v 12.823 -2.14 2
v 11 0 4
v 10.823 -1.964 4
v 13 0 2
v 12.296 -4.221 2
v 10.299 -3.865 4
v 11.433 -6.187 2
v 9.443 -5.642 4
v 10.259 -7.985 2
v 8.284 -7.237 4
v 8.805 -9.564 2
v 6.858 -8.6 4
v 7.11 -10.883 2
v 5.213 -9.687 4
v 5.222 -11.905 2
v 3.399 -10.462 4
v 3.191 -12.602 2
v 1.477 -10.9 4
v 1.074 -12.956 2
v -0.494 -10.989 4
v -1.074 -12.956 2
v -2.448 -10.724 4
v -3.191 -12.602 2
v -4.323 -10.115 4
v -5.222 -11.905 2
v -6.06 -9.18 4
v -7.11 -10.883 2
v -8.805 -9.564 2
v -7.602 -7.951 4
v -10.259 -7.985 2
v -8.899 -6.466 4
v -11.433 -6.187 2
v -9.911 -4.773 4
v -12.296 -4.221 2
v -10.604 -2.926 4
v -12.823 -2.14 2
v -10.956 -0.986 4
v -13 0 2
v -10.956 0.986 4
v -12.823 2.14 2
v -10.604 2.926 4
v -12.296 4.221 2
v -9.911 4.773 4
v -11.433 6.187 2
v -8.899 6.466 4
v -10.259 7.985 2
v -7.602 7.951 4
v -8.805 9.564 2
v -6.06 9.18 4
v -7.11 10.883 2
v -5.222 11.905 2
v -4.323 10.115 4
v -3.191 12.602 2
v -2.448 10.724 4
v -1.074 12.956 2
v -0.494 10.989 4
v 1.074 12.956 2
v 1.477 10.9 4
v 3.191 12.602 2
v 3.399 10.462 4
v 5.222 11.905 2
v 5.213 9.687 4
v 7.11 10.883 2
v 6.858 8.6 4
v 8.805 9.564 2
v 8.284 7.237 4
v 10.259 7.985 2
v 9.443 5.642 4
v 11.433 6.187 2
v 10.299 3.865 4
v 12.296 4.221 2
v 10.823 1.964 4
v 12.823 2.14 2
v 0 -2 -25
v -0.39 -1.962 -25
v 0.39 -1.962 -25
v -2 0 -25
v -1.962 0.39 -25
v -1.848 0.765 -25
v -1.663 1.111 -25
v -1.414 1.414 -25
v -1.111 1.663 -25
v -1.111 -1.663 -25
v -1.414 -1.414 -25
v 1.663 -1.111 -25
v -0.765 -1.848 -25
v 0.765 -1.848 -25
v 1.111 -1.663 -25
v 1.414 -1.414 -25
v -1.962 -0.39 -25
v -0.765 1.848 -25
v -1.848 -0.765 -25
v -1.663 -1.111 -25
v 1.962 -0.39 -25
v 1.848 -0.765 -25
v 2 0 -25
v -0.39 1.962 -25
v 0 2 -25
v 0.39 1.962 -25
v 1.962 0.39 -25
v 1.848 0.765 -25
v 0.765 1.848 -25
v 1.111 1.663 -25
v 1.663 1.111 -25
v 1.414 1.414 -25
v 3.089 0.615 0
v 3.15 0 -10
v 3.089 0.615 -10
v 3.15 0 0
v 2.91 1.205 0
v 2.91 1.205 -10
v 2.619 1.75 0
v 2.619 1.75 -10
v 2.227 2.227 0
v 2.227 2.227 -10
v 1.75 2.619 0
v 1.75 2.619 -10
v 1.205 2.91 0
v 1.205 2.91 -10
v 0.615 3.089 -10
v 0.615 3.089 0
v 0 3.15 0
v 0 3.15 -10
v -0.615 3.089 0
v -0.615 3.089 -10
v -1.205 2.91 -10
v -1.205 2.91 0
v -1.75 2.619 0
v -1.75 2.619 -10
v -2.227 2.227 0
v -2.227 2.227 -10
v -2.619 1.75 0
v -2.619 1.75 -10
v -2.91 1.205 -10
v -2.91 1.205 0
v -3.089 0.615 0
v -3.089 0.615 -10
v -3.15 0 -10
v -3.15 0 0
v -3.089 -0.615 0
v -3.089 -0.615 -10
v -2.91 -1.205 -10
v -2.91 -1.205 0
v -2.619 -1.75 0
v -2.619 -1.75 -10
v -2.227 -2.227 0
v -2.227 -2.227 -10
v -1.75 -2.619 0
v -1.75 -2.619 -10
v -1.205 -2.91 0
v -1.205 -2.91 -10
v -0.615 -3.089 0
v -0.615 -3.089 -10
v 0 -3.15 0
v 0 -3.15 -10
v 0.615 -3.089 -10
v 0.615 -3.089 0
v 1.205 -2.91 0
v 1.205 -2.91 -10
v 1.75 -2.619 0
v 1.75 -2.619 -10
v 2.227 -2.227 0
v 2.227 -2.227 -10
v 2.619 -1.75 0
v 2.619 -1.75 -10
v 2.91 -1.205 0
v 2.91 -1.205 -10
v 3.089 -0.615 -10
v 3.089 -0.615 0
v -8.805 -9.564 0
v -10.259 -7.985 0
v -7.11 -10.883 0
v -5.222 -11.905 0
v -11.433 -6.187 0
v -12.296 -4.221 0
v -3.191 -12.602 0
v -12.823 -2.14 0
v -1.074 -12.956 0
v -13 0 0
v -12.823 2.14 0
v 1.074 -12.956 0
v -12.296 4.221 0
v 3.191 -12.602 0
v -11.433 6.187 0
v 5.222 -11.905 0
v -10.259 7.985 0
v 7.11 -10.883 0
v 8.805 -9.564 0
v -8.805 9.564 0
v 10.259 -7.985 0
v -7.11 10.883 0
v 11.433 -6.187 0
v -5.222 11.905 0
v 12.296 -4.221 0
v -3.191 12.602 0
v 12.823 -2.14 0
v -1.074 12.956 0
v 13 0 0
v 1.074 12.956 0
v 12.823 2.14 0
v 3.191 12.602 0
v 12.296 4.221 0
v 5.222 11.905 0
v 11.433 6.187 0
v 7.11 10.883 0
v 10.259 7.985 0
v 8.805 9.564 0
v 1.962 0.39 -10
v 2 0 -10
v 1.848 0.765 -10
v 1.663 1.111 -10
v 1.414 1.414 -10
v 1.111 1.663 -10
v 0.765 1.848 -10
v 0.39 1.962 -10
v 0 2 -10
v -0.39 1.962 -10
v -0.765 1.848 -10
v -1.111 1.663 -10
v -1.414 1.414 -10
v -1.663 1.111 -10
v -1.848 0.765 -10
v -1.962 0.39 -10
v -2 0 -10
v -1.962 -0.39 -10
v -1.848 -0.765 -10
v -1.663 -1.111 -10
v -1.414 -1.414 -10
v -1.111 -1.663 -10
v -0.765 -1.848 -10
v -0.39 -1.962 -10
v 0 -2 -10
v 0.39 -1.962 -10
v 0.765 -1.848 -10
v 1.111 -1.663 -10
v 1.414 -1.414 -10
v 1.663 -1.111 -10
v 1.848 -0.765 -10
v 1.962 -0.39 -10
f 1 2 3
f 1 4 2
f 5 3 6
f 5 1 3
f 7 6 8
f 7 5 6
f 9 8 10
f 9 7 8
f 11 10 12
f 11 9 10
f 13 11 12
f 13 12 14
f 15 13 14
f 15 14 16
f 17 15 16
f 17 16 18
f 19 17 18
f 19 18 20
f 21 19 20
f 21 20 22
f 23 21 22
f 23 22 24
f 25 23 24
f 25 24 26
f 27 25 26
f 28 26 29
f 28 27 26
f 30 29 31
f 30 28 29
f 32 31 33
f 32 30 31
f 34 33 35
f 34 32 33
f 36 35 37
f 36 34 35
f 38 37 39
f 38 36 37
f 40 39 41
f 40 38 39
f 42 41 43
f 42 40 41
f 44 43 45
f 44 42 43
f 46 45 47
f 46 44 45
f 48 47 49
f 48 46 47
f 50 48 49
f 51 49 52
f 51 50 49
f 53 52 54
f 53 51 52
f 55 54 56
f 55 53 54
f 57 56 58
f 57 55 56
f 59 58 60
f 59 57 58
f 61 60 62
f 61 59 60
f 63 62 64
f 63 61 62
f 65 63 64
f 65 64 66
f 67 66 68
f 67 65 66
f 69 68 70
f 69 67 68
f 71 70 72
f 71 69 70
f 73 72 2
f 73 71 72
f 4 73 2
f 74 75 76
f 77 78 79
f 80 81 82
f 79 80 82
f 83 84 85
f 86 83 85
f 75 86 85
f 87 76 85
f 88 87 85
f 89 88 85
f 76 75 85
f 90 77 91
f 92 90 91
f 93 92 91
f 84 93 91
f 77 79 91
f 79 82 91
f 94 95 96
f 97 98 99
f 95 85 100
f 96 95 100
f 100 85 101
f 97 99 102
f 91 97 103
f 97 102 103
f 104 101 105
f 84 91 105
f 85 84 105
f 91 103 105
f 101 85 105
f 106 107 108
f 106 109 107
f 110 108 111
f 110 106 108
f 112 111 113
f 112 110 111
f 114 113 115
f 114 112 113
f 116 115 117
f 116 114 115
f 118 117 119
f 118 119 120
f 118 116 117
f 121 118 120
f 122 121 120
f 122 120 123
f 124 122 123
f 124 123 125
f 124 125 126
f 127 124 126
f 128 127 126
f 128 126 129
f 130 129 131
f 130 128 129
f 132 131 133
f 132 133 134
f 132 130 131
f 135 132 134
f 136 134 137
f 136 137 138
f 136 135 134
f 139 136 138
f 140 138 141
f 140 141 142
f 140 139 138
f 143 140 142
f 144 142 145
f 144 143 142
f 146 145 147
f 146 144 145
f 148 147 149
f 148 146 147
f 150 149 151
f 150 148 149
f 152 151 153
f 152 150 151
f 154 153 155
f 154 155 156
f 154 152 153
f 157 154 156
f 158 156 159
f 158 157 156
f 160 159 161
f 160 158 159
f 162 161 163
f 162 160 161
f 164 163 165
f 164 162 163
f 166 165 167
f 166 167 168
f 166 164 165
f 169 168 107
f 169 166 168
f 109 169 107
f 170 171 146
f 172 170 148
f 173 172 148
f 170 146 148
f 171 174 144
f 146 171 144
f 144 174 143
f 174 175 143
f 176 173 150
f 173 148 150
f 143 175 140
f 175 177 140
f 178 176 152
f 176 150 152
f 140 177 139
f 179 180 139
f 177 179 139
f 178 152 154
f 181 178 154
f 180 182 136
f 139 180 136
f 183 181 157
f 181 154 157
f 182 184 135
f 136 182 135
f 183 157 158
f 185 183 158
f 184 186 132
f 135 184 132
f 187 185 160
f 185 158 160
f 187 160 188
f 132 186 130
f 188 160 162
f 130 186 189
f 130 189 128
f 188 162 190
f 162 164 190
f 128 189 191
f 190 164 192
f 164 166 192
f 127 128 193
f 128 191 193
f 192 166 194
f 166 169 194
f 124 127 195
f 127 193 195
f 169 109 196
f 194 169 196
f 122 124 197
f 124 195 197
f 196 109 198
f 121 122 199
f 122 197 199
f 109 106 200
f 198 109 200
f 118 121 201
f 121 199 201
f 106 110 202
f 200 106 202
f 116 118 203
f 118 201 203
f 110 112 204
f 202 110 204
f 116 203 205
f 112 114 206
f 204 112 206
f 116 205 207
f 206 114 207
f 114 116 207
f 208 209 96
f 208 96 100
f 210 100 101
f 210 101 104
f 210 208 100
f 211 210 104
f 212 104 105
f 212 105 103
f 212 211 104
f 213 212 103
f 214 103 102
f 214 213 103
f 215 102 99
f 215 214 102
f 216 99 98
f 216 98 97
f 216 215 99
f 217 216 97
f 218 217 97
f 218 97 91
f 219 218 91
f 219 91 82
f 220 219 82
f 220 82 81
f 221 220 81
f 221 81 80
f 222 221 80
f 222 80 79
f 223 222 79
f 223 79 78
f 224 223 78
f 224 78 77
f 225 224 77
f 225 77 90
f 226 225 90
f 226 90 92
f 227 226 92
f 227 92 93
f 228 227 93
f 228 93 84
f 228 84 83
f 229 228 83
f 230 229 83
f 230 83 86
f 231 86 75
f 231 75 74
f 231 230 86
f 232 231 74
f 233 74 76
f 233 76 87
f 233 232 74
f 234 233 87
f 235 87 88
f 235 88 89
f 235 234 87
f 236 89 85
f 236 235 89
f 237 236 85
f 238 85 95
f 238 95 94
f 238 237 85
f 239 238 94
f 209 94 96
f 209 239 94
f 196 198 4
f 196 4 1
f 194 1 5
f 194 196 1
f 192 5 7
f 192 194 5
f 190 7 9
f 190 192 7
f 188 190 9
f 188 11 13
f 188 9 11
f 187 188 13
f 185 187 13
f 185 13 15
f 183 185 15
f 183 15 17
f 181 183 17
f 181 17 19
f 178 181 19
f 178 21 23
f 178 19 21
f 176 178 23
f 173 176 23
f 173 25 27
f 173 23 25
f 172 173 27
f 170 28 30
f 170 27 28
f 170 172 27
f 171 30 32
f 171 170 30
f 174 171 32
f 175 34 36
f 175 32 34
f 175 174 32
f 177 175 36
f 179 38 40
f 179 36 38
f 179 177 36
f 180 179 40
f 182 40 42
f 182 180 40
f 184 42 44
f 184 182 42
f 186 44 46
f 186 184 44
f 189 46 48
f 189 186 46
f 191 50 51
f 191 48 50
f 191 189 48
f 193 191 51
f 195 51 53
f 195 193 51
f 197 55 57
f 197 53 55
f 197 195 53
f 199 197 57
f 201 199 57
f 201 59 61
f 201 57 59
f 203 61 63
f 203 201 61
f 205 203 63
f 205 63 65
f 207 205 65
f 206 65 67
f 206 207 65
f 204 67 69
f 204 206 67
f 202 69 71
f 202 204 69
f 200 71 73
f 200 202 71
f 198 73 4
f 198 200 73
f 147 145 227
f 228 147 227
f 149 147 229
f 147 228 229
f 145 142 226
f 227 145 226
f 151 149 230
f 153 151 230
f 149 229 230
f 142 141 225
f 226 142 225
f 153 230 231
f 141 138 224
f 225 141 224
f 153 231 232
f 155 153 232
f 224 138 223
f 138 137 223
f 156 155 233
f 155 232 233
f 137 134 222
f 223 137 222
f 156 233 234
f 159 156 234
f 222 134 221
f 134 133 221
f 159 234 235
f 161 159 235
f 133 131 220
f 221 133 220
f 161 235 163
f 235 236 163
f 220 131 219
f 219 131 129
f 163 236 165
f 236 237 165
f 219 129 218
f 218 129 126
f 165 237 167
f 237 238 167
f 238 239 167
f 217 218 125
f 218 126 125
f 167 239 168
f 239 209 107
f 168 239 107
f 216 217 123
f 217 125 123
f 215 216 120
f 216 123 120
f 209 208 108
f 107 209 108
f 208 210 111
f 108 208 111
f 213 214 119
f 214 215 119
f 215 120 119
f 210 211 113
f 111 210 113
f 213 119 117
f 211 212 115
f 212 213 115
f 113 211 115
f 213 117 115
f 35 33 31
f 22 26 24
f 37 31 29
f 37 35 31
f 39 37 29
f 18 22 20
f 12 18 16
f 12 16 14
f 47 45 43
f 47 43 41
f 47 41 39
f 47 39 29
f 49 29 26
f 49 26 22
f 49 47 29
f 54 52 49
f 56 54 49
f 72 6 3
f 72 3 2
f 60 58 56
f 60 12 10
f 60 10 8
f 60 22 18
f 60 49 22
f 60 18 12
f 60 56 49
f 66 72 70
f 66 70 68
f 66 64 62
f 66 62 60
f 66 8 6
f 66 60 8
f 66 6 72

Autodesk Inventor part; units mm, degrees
ref_plane "YZ Plane" through (0, 0, 0) normal (1, 0, 0) x (0, 1, 0)
ref_plane "XZ Plane" through (0, 0, 0) normal (0, 1, 0) x (-1, 0, 0)
ref_plane "XY Plane" through (0, 0, 0) normal (0, 0, 1) x (1, 0, 0)
sketch "Sketch1" plane through (0, 0, 0) normal (0, 0, 1) x (1, 0, 0)
  circle A0 centre (0, 0) radius 13
  circle A1 centre (0, 0) radius 11.5
  circle A2 centre (0, 0) radius 3.15
  circle A3 centre (0, 0) radius 2
  dimension "d0" = 26
  dimension "d1" = 23
  dimension "d2" = 6.3
  dimension "d3" = 4
extrude "Extrusion1" add sketch "Sketch1" along normal blind 4 contours A0
extrude "Extrusion2" add sketch "Sketch1" along normal blind 4 contours A1 | A2 | A3
extrude "Extrusion3" add sketch "Sketch1" against normal blind 10 contours A2 | A3
extrude "Extrusion4" add sketch "Sketch1" against normal blind 25 contours A3
chamfer "Chamfer1" distance 2 angle 45 1 edges at (-13, 0, 4)
thread "Thread1" size "M4x0.7" class "6g" standard "ISO Metric profile" length 15
properties part number "Manija para Bandeja"
